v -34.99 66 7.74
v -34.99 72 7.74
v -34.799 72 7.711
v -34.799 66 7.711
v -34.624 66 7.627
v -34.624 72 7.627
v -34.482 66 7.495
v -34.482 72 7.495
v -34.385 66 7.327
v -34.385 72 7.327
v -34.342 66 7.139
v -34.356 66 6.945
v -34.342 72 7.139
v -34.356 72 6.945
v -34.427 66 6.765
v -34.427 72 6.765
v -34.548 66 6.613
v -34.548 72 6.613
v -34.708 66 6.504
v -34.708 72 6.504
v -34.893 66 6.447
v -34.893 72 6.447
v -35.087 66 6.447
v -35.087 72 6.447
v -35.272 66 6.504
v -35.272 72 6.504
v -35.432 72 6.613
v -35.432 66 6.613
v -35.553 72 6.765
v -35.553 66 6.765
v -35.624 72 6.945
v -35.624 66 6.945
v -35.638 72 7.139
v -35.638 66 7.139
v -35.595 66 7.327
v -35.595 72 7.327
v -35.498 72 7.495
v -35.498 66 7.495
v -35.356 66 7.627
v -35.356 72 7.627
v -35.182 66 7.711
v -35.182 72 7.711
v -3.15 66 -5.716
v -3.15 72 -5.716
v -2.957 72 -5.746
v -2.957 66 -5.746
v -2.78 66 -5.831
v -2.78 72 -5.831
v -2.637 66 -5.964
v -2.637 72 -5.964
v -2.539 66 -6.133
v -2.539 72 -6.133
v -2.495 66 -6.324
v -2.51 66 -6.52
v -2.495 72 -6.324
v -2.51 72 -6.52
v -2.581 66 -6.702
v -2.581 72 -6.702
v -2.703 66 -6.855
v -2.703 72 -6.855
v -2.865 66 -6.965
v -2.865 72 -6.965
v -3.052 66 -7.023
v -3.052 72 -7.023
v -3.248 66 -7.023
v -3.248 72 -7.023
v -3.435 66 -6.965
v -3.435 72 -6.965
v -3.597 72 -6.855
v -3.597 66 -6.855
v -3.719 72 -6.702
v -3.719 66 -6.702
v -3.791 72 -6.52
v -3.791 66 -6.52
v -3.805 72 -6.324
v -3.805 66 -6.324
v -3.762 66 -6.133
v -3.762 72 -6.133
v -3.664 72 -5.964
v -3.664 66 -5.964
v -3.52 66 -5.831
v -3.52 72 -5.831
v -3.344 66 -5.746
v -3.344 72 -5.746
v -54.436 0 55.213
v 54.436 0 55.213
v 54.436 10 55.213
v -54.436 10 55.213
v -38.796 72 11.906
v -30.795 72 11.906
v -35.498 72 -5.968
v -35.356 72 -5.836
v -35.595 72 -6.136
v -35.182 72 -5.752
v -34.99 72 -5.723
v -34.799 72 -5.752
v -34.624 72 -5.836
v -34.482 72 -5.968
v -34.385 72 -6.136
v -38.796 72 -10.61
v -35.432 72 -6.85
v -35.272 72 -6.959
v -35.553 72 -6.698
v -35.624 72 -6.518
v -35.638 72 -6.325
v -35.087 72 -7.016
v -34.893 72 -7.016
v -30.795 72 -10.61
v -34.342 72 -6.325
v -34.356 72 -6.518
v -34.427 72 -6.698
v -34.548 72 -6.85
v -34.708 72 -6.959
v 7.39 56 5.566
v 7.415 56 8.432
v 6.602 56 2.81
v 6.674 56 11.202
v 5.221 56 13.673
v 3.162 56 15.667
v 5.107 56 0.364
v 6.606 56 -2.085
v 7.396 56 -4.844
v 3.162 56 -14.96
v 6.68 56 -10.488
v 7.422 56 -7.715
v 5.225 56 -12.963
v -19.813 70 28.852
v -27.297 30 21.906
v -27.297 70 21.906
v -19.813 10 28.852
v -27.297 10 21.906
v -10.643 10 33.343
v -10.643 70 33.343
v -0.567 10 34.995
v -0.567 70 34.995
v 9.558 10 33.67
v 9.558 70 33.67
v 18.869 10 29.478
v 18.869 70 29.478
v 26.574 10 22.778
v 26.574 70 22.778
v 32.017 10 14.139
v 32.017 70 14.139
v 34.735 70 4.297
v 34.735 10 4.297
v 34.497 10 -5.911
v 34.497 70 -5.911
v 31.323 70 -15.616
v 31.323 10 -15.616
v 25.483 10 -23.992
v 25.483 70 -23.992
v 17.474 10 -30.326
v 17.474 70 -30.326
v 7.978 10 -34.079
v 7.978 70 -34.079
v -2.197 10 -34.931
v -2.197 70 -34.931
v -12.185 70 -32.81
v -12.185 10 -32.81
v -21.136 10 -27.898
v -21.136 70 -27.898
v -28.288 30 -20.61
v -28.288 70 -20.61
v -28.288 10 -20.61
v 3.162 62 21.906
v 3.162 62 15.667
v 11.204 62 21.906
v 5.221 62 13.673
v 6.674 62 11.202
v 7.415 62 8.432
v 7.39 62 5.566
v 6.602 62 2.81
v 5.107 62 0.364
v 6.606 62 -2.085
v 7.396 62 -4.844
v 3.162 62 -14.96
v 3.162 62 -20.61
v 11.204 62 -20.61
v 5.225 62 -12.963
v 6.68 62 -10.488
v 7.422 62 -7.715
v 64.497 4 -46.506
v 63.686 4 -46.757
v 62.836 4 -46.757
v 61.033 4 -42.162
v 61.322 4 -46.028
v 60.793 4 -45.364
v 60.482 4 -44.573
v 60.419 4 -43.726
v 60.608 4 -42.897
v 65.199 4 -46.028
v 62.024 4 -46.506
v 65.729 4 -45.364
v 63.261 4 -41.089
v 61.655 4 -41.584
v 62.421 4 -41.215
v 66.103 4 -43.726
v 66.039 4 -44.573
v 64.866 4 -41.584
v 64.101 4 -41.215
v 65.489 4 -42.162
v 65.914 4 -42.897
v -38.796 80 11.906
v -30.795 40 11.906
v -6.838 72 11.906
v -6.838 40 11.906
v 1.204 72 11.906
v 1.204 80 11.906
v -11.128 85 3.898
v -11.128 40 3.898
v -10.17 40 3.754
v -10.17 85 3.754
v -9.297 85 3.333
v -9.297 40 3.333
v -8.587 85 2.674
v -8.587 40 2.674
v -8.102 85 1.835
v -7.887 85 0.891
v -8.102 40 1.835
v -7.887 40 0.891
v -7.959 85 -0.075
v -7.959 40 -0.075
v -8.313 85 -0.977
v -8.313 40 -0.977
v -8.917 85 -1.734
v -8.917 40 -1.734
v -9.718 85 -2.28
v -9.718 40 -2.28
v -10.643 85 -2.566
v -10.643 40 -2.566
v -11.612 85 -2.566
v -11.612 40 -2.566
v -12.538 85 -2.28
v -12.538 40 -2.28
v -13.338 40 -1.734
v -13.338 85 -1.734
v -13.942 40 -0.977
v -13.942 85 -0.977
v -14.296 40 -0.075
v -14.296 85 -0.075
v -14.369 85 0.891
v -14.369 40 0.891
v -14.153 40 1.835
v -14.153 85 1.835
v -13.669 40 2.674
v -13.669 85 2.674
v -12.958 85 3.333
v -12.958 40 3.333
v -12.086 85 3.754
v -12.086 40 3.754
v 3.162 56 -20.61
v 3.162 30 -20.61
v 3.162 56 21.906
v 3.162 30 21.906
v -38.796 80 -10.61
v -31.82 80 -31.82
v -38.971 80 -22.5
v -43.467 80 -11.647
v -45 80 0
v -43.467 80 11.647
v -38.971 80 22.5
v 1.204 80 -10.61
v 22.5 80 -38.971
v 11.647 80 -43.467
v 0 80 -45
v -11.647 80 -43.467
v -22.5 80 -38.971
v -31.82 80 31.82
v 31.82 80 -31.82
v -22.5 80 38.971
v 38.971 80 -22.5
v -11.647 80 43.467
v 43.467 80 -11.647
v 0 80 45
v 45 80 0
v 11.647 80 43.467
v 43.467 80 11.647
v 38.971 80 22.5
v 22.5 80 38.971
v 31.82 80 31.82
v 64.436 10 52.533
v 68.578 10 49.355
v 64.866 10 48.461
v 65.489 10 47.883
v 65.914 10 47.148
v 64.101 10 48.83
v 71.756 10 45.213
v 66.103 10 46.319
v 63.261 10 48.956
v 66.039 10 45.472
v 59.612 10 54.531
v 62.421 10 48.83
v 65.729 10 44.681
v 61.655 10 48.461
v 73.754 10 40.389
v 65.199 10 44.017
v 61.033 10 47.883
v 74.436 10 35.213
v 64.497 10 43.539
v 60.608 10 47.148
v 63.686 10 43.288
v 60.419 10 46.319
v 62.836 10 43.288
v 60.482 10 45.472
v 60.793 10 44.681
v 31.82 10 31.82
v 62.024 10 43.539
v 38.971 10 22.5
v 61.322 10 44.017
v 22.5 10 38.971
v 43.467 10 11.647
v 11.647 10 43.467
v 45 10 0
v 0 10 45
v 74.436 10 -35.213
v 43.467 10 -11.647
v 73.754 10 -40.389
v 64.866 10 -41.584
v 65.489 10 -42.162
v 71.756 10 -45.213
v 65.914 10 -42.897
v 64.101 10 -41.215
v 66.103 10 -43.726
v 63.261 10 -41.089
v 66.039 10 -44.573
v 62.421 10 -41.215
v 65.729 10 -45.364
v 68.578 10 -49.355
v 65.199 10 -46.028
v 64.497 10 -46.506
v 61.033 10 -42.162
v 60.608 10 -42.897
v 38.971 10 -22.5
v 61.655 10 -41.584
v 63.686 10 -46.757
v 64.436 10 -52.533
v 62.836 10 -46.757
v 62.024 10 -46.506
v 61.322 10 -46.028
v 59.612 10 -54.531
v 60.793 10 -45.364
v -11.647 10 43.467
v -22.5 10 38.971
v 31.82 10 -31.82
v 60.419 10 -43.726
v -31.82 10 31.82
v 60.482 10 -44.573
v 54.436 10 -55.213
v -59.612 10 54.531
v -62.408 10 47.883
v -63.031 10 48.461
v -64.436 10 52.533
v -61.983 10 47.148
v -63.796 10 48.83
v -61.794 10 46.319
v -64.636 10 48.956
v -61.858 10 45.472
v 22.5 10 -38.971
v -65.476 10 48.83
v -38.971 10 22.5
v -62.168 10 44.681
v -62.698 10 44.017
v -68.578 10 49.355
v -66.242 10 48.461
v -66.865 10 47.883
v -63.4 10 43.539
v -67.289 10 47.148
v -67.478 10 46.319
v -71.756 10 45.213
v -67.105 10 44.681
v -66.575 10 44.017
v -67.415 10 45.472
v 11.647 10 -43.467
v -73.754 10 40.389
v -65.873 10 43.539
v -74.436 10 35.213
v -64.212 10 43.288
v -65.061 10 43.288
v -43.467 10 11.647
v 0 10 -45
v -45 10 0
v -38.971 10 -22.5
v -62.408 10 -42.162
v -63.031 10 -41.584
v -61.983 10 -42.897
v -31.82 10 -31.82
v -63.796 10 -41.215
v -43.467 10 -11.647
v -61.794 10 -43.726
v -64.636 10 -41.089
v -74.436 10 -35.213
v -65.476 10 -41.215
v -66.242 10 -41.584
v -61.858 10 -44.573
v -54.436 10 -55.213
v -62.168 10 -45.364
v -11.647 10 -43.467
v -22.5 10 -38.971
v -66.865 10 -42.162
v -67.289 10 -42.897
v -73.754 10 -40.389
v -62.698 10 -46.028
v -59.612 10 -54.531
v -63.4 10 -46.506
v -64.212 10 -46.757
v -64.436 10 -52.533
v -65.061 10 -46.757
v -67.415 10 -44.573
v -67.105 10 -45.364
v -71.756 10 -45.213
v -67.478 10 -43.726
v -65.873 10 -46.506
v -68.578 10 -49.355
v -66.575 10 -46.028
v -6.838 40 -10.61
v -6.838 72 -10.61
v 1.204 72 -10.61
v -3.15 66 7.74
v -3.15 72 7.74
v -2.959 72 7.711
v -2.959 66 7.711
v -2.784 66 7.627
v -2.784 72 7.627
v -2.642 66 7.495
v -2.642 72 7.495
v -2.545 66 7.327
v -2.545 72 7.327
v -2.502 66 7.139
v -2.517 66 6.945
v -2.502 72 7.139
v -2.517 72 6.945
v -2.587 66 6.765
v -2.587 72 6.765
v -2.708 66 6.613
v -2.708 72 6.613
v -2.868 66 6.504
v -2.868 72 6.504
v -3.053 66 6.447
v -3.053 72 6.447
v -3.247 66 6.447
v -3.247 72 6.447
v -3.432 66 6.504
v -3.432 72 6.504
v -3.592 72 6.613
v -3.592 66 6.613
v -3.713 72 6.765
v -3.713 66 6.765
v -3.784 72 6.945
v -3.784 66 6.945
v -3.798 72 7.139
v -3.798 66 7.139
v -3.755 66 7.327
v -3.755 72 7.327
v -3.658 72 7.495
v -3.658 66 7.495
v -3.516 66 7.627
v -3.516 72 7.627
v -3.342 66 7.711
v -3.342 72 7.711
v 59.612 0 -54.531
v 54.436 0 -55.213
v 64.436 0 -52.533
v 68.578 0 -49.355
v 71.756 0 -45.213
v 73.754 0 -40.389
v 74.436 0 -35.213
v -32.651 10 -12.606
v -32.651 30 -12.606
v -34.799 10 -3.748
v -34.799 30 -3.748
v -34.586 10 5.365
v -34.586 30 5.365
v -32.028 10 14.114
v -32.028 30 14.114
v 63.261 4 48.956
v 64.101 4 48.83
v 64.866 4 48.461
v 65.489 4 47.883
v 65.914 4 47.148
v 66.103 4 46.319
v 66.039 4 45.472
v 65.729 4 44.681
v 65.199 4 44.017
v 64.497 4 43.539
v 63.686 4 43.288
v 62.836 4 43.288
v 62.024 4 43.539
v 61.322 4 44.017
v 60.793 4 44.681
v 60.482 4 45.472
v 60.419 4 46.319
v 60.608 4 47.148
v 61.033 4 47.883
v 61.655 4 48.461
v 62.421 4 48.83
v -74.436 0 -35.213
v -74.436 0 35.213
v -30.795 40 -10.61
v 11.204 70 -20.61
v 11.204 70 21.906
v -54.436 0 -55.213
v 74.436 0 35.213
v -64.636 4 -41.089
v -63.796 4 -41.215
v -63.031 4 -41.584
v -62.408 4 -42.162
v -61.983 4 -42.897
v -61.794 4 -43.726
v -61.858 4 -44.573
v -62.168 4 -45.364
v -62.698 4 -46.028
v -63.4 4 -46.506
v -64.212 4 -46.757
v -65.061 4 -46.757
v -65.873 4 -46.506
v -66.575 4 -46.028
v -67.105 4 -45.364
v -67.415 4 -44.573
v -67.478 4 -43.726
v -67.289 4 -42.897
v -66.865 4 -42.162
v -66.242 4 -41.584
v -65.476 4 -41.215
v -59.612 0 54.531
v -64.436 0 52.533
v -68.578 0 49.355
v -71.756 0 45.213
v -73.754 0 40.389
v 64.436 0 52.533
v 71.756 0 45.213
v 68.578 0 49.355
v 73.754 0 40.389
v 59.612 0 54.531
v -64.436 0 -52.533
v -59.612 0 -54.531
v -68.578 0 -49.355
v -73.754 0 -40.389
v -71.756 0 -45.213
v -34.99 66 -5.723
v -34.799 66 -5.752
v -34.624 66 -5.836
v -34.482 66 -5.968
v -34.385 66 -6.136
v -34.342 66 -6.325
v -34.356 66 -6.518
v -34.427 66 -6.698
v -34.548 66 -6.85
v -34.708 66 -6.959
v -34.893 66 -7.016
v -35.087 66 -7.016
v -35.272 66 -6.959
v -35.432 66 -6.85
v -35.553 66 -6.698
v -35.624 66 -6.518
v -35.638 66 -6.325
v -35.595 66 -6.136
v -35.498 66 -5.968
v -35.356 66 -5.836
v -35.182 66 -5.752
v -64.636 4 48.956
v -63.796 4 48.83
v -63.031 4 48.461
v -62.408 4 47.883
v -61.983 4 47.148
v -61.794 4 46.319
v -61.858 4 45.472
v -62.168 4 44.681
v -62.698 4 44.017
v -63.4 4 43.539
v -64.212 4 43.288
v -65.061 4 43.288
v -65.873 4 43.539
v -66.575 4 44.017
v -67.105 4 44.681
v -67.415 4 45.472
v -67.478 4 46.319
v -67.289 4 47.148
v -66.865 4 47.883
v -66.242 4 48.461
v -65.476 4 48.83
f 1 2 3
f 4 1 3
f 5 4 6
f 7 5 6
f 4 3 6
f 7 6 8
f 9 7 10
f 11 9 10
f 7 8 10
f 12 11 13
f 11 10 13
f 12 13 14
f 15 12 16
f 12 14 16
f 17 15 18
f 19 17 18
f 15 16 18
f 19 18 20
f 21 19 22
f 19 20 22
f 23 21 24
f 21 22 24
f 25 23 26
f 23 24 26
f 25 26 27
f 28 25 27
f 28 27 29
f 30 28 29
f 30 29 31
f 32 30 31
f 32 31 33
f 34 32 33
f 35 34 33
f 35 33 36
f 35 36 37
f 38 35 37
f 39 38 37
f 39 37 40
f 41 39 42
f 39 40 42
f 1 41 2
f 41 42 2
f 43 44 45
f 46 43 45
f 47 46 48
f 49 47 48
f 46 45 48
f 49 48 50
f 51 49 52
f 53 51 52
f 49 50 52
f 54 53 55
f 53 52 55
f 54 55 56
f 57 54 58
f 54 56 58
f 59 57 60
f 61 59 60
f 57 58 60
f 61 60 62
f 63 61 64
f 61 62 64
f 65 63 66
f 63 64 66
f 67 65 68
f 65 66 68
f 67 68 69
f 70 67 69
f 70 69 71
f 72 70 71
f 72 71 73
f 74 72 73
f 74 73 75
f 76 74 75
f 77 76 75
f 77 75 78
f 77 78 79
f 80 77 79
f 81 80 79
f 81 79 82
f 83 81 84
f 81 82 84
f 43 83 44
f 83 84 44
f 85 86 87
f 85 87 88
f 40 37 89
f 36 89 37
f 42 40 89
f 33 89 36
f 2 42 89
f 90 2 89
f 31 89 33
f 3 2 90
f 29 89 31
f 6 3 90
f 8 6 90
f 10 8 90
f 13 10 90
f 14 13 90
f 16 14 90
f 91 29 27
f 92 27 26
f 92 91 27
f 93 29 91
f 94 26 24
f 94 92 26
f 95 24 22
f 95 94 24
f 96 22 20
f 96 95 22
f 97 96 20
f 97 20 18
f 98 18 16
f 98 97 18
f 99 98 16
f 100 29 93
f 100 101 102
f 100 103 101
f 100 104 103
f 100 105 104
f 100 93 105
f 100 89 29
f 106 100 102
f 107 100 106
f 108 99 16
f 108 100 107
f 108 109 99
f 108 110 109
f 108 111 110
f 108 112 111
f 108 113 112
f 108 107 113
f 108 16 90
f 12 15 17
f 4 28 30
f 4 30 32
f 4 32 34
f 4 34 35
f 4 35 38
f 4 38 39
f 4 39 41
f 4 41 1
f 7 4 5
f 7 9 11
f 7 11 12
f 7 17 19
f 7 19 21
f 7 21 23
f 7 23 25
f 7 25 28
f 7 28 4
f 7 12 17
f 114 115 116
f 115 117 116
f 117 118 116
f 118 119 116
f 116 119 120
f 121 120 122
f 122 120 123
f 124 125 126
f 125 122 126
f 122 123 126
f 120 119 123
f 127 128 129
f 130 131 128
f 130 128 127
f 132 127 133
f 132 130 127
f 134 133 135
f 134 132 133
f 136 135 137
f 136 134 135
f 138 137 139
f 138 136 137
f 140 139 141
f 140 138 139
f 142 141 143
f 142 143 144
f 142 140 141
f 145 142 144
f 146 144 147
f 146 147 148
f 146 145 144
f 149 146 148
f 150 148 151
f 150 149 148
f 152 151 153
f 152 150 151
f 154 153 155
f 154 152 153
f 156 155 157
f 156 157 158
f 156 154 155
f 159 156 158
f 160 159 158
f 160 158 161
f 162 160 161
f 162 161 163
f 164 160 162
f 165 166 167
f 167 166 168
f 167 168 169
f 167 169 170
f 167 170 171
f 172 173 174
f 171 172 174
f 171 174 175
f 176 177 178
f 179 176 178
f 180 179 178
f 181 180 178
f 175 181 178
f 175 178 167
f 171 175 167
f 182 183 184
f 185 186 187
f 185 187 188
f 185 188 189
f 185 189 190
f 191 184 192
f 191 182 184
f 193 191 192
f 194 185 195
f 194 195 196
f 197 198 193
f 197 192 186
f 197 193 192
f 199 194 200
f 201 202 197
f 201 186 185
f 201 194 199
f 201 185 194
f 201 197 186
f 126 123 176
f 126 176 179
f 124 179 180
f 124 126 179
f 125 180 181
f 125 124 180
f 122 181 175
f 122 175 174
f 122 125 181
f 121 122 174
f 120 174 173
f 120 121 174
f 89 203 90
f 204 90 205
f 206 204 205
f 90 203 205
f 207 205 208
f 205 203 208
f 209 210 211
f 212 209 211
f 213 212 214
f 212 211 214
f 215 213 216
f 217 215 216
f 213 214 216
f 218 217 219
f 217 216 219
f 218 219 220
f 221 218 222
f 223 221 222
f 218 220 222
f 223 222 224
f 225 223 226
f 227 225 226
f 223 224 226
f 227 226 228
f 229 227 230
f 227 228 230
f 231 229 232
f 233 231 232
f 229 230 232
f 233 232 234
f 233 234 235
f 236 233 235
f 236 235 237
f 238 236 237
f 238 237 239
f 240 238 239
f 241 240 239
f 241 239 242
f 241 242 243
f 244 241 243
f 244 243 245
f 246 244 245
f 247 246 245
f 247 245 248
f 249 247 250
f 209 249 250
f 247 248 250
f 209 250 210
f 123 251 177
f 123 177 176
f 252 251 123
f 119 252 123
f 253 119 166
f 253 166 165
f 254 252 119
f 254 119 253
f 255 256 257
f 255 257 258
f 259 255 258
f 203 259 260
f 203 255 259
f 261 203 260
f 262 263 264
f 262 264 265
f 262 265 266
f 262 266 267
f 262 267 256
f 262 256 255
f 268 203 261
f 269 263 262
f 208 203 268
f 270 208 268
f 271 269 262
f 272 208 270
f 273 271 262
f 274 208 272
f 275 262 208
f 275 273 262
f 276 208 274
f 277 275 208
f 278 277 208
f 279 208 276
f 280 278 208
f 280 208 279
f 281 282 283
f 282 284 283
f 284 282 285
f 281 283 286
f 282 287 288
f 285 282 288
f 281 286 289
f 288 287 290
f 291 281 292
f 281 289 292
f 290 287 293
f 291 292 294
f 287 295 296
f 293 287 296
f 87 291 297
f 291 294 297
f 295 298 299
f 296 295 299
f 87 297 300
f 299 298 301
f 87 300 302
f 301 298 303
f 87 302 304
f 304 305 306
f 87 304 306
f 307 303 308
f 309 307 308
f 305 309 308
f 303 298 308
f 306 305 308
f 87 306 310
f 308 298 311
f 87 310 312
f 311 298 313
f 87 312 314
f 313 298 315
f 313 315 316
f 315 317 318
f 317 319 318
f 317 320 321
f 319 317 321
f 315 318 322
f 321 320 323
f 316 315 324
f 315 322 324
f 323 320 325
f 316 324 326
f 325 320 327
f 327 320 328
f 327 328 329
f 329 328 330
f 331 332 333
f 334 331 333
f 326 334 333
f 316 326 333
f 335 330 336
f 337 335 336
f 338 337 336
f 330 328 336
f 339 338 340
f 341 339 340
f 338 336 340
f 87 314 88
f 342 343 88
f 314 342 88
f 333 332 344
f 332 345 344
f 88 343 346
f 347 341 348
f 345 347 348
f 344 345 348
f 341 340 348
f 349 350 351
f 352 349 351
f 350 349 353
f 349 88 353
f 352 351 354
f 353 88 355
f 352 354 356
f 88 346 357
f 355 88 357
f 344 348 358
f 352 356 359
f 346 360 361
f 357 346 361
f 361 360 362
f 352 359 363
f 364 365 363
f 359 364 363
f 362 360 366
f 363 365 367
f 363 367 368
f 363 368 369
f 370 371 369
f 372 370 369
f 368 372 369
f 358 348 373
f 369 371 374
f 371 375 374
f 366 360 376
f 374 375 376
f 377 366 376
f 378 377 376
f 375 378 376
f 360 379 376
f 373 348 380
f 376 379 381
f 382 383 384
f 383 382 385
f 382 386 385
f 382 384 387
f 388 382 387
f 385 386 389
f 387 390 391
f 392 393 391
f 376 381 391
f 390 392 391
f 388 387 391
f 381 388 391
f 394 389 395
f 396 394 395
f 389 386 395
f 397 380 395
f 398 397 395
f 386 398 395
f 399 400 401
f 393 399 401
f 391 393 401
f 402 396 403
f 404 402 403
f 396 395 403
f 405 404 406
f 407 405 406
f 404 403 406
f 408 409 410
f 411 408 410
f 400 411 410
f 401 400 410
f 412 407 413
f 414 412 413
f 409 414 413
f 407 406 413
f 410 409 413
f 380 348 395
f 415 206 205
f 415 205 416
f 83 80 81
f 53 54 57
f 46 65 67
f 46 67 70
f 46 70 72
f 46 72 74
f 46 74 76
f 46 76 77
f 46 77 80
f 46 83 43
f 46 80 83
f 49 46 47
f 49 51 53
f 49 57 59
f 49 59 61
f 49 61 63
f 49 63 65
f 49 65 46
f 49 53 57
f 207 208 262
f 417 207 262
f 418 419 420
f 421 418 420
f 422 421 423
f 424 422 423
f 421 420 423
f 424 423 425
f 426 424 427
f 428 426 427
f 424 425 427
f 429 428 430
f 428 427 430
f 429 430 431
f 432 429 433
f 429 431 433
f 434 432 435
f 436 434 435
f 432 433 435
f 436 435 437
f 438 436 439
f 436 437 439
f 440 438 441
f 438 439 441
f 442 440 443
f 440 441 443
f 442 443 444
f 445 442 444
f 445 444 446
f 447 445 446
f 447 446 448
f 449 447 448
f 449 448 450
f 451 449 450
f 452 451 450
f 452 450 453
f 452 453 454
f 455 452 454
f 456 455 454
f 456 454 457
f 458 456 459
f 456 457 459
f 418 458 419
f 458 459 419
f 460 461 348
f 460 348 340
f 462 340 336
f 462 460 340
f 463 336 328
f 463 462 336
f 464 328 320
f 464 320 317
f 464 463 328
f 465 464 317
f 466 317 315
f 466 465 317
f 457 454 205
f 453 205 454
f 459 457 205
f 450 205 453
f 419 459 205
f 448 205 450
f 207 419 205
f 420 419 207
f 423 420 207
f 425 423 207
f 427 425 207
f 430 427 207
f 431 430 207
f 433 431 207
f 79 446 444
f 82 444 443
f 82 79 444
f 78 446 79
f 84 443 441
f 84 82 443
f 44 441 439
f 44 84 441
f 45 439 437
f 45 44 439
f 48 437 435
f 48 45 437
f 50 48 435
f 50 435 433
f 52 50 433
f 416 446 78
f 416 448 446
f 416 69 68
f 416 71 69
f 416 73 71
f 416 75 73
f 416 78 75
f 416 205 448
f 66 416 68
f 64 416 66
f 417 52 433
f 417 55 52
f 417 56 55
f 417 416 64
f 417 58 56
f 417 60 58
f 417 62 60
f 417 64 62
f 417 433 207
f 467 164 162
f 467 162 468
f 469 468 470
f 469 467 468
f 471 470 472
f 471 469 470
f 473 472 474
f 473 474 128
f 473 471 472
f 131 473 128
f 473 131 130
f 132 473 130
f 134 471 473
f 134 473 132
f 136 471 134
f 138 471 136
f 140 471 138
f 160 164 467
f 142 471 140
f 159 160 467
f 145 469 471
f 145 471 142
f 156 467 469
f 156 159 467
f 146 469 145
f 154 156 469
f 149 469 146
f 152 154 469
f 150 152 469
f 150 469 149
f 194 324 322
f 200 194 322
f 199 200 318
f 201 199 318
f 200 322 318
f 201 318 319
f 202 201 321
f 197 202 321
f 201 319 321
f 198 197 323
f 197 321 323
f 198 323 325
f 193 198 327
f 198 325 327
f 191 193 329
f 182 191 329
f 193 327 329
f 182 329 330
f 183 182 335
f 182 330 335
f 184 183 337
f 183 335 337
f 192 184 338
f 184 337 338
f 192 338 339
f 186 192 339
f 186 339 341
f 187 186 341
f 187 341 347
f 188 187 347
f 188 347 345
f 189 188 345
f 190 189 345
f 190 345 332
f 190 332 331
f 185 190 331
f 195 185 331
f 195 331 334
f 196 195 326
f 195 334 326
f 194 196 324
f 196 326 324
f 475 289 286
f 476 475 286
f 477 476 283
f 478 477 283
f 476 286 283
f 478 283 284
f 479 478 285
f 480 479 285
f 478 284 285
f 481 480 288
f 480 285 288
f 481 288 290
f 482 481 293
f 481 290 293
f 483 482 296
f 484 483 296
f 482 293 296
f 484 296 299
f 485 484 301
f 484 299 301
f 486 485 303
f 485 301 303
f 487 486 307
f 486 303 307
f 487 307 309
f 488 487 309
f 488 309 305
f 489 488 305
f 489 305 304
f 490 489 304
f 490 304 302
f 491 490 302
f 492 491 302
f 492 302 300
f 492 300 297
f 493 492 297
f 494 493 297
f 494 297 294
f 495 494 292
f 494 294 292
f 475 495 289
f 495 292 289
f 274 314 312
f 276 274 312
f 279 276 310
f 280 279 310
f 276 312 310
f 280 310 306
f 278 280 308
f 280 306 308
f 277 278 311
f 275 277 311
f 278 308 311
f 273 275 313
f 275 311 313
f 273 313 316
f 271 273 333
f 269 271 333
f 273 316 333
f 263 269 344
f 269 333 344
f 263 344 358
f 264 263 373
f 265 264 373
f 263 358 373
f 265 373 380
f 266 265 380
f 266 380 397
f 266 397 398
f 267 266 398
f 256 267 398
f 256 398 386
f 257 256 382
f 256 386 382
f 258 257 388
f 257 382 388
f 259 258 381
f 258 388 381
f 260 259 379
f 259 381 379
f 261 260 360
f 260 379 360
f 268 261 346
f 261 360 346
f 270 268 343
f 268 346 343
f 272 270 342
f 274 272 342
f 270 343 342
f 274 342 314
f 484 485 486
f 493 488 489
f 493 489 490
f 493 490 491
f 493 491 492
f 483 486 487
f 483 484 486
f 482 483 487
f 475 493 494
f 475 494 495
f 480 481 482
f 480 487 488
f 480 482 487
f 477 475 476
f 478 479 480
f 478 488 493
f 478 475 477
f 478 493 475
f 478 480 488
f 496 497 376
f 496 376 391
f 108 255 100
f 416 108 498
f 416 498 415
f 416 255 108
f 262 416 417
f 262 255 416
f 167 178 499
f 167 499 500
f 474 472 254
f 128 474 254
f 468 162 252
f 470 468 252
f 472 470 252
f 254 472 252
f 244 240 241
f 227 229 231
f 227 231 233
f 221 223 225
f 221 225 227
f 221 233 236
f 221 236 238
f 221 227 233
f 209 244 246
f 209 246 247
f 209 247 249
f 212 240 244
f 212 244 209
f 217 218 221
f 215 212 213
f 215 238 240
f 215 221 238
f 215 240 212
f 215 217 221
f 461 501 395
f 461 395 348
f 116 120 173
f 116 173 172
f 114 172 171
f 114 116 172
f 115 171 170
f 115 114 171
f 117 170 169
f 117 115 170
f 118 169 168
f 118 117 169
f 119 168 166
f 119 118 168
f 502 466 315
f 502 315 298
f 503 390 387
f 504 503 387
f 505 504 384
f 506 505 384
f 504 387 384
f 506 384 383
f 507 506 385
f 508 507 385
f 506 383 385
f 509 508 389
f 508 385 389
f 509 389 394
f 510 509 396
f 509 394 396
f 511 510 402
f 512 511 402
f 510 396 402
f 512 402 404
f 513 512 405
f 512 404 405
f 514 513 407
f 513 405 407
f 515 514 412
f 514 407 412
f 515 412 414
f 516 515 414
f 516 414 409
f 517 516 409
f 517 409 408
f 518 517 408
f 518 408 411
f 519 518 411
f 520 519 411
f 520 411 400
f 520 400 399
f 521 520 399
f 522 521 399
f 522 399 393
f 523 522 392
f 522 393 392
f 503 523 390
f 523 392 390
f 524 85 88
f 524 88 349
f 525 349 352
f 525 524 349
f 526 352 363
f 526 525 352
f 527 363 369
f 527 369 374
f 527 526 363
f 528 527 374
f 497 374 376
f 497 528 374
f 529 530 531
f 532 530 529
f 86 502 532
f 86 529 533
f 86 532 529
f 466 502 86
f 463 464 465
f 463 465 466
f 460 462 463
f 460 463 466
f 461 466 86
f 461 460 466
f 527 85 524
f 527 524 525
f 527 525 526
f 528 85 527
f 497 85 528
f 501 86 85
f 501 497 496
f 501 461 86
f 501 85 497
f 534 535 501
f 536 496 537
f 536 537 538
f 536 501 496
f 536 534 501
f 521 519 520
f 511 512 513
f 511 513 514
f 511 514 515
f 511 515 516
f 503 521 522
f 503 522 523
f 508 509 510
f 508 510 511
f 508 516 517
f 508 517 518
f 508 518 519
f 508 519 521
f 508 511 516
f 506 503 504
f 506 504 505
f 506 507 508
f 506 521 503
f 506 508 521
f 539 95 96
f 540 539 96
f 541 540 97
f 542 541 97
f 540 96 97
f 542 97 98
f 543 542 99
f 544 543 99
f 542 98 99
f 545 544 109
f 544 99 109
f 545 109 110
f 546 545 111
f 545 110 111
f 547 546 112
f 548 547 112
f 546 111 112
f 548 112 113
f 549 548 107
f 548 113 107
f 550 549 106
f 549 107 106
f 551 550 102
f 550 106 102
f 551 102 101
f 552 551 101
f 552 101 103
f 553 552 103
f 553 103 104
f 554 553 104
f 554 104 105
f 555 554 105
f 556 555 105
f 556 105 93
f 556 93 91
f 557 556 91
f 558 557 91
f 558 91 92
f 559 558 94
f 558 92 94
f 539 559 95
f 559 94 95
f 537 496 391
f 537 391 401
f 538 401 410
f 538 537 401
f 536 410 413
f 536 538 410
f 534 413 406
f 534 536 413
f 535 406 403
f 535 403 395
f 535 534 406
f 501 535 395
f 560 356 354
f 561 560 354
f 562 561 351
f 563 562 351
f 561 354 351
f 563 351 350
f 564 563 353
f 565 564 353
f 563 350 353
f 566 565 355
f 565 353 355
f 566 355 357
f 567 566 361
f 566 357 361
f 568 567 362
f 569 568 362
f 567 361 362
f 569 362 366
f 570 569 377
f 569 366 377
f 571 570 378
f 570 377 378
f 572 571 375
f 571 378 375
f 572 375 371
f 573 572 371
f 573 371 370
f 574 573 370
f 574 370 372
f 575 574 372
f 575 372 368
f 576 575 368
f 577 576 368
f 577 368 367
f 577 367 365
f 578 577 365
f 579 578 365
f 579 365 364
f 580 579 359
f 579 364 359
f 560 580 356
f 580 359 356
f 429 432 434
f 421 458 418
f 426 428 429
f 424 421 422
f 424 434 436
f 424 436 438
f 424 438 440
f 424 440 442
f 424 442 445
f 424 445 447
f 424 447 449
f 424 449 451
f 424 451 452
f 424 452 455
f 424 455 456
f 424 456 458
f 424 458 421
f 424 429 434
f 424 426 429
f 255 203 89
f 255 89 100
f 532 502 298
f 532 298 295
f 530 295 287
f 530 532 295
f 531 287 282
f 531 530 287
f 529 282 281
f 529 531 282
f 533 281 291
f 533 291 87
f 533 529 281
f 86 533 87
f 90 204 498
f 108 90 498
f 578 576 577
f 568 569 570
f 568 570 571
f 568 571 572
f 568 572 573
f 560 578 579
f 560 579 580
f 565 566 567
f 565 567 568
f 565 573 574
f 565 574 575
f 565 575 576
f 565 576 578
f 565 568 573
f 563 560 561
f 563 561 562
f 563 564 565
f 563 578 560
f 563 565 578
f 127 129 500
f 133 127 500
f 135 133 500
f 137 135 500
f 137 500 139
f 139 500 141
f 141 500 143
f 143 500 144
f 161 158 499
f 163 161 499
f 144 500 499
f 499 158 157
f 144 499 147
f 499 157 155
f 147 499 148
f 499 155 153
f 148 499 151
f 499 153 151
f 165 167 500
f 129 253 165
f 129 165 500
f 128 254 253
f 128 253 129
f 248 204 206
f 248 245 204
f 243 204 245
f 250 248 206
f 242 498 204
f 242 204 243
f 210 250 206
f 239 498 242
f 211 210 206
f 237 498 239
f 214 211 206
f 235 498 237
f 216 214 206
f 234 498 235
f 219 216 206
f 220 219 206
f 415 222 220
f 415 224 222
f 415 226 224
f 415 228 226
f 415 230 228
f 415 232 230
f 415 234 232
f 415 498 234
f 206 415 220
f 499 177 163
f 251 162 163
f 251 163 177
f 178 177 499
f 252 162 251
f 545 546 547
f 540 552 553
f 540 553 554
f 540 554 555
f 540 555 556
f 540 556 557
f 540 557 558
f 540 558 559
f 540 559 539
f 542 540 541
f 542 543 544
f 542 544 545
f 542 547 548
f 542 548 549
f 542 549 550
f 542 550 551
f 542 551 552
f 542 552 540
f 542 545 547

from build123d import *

# Parameters (mm, degrees)
BOSS_EXTRUDE2_DEPTH = 10
SKETCH3_R           = 45
BOSS_EXTRUDE3_DEPTH = 70
SKETCH5_W           = 40
SKETCH5_H           = 22.516210705
CUT_EXTRUDE1_DEPTH  = 40
SKETCH6_W           = 8.00117247
SKETCH6_H           = 22.516210705
SKETCH6_W_2         = 8.041819545
BOSS_EXTRUDE4_DEPTH = 32
SKETCH8_R           = 0.656937265
SKETCH8_R_2         = 0.65
CUT_EXTRUDE2_DEPTH  = 6
SHELL16_START       = 10
SHELL16_DEPTH       = 60
SHELL16_2_DEPTH     = 20
SHELL16_START_2     = 30
SHELL16_3_OUTLINE_W = 8.041819545
SHELL16_3_OUTLINE_H = 42.516210705
SHELL16_3_DEPTH     = 26
SHELL16_START_3     = 56
SHELL16_4_DEPTH     = 6
SKETCH9_R           = 2.85
CUT_EXTRUDE3_DEPTH  = 6
SKETCH10_R          = 3.25
BOSS_EXTRUDE5_DEPTH = 45


# Read off the part's stored shape, not the designer's step: Shell16
with BuildPart() as part:
    # Sketch2 → Boss-Extrude2 (new body)
    with BuildSketch(Plane(origin=(0, 0, 0), x_dir=(1, 0, 0), z_dir=(0, 1, 0))):
        with BuildLine():
            Line((-54.435630286, 55.212655463), (54.435630286, 55.212655463))
            ThreePointArc((54.435630286, 55.212655463), (68.577765909, 49.354791087), (74.435630286, 35.212655463))
            Line((74.435630286, 35.212655463), (74.435630286, -35.212655463))
            ThreePointArc((74.435630286, -35.212655463), (68.577765909, -49.354791087), (54.435630286, -55.212655463))
            Line((54.435630286, -55.212655463), (-54.435630286, -55.212655463))
            ThreePointArc((-54.435630286, -55.212655463), (-68.577765909, -49.354791087), (-74.435630286, -35.212655463))
            Line((-74.435630286, -35.212655463), (-74.435630286, 35.212655463))
            ThreePointArc((-74.435630286, 35.212655463), (-68.577765909, 49.354791087), (-54.435630286, 55.212655463))
        make_face()
    extrude(amount=BOSS_EXTRUDE2_DEPTH)

    # Sketch3 → Boss-Extrude3 (add)
    with BuildSketch(Plane(origin=(0, 10, 0), x_dir=(1, 0, 0), z_dir=(0, 1, 0))):
        with Locations(Location((0, 0, 0), (0, 0, 270))):
            Circle(SKETCH3_R)
    extrude(amount=BOSS_EXTRUDE3_DEPTH)

    # Sketch5 → Cut-Extrude1 (cut)
    with BuildSketch(Plane(origin=(0, 80, 0), x_dir=(1, 0, 0), z_dir=(0, 1, 0))):
        with Locations((-18.795917007, -0.647948509)):
            Rectangle(SKETCH5_W, SKETCH5_H)
    extrude(amount=-CUT_EXTRUDE1_DEPTH, mode=Mode.SUBTRACT)

    # Sketch6 → Boss-Extrude4 (add)
    with BuildSketch(Plane(origin=(0, 40, 0), x_dir=(1, 0, 0), z_dir=(0, 1, 0))):
        with Locations((-34.795330772, -0.647948509)):
            Rectangle(SKETCH6_W, SKETCH6_H)
        with Locations((-2.81682678, -0.647948509)):
            Rectangle(SKETCH6_W_2, SKETCH6_H)
    extrude(amount=BOSS_EXTRUDE4_DEPTH)

    # Sketch8 → Cut-Extrude2 (cut)
    with BuildSketch(Plane(origin=(0, 72, 0), x_dir=(1, 0, 0), z_dir=(0, 1, 0))):
        with Locations(Location((-3.150273661, 6.373412823, 0), (0, 0, 270))):
            Circle(SKETCH8_R)
        with Locations(Location((-3.150273661, -7.089946011, 0), (0, 0, 270))):
            Circle(SKETCH8_R_2)
        with Locations(Location((-34.990160193, 6.373412823, 0), (0, 0, 270))):
            Circle(SKETCH8_R_2)
        with Locations(Location((-34.990160193, -7.089946011, 0), (0, 0, 270))):
            Circle(SKETCH8_R_2)
    extrude(amount=-CUT_EXTRUDE2_DEPTH, mode=Mode.SUBTRACT)

    # Shell16 outline → Shell16 (cut)
    with BuildSketch(Plane(origin=(0, 0, 0), x_dir=(1, 0, 0), z_dir=(0, 1, 0)).offset(SHELL16_START)):
        with BuildLine():
            ThreePointArc((-27.296974268, -21.906053862), (34.990492106, 0.815758643), (-28.28818543, 20.610156843))
            Line((-28.28818543, 20.610156843), (11.204082993, 20.610156843))
            Line((11.204082993, 20.610156843), (11.204082993, -21.906053862))
            Line((11.204082993, -21.906053862), (-27.296974268, -21.906053862))
        make_face()
    extrude(amount=SHELL16_DEPTH, mode=Mode.SUBTRACT)

    # Shell16 2 outline → Shell16 2 (cut)
    with BuildSketch(Plane(origin=(0, 0, 0), x_dir=(1, 0, 0), z_dir=(0, 1, 0)).offset(SHELL16_START)):
        with BuildLine():
            ThreePointArc((-28.28818543, 20.610156843), (-34.990492106, -0.815758643), (-27.296974268, -21.906053862))
            Line((-27.296974268, -21.906053862), (11.204082993, -21.906053862))
            Line((11.204082993, -21.906053862), (11.204082993, 20.610156843))
            Line((11.204082993, 20.610156843), (-28.28818543, 20.610156843))
        make_face()
    extrude(amount=SHELL16_2_DEPTH, mode=Mode.SUBTRACT)

    # Shell16 3 outline → Shell16 3 (cut)
    with BuildSketch(Plane(origin=(0, 0, 0), x_dir=(1, 0, 0), z_dir=(0, 1, 0)).offset(SHELL16_START_2)):
        with Locations((7.183173221, -0.647948509)):
            Rectangle(SHELL16_3_OUTLINE_W, SHELL16_3_OUTLINE_H)
    extrude(amount=SHELL16_3_DEPTH, mode=Mode.SUBTRACT)

    # Shell16 4 outline → Shell16 4 (cut)
    with BuildSketch(Plane(origin=(0, 0, 0), x_dir=(1, 0, 0), z_dir=(0, 1, 0)).offset(SHELL16_START_3)):
        with BuildLine():
            Line((11.204082993, 20.610156843), (3.162263448, 20.610156843))
            Line((3.162263448, 20.610156843), (3.162263448, 14.95957536))
            ThreePointArc((3.162263448, 14.95957536), (7.421869806, 7.715088784), (5.106897043, -0.363756008))
            ThreePointArc((5.106897043, -0.363756008), (7.414773238, -8.432437732), (3.162263448, -15.667496667))
            Line((3.162263448, -15.667496667), (3.162263448, -21.906053862))
            Line((3.162263448, -21.906053862), (11.204082993, -21.906053862))
            Line((11.204082993, -21.906053862), (11.204082993, 20.610156843))
        make_face()
    extrude(amount=SHELL16_4_DEPTH, mode=Mode.SUBTRACT)

    # Sketch9 → Cut-Extrude3 (cut)
    with BuildSketch(Plane(origin=(0, 10, 0), x_dir=(1, 0, 0), z_dir=(0, 1, 0))):
        with Locations(Location((-64.63637004, 43.938587161, 0), (0, 0, 270))):
            Circle(SKETCH9_R)
        with Locations(Location((63.260769817, 43.938587161, 0), (0, 0, 270))):
            Circle(SKETCH9_R)
        with Locations(Location((-64.63637004, -46.106335294, 0), (0, 0, 270))):
            Circle(SKETCH9_R)
        with Locations(Location((63.260769817, -46.106335294, 0), (0, 0, 270))):
            Circle(SKETCH9_R)
    extrude(amount=-CUT_EXTRUDE3_DEPTH, mode=Mode.SUBTRACT)

    # Sketch10 → Boss-Extrude5 (add)
    with BuildSketch(Plane(origin=(0, 40, 0), x_dir=(1, 0, 0), z_dir=(0, 1, 0))):
        with Locations(Location((-11.127628751, -0.64794851, 0), (0, 0, 270))):
            Circle(SKETCH10_R)
    extrude(amount=BOSS_EXTRUDE5_DEPTH)


solid = part.part
